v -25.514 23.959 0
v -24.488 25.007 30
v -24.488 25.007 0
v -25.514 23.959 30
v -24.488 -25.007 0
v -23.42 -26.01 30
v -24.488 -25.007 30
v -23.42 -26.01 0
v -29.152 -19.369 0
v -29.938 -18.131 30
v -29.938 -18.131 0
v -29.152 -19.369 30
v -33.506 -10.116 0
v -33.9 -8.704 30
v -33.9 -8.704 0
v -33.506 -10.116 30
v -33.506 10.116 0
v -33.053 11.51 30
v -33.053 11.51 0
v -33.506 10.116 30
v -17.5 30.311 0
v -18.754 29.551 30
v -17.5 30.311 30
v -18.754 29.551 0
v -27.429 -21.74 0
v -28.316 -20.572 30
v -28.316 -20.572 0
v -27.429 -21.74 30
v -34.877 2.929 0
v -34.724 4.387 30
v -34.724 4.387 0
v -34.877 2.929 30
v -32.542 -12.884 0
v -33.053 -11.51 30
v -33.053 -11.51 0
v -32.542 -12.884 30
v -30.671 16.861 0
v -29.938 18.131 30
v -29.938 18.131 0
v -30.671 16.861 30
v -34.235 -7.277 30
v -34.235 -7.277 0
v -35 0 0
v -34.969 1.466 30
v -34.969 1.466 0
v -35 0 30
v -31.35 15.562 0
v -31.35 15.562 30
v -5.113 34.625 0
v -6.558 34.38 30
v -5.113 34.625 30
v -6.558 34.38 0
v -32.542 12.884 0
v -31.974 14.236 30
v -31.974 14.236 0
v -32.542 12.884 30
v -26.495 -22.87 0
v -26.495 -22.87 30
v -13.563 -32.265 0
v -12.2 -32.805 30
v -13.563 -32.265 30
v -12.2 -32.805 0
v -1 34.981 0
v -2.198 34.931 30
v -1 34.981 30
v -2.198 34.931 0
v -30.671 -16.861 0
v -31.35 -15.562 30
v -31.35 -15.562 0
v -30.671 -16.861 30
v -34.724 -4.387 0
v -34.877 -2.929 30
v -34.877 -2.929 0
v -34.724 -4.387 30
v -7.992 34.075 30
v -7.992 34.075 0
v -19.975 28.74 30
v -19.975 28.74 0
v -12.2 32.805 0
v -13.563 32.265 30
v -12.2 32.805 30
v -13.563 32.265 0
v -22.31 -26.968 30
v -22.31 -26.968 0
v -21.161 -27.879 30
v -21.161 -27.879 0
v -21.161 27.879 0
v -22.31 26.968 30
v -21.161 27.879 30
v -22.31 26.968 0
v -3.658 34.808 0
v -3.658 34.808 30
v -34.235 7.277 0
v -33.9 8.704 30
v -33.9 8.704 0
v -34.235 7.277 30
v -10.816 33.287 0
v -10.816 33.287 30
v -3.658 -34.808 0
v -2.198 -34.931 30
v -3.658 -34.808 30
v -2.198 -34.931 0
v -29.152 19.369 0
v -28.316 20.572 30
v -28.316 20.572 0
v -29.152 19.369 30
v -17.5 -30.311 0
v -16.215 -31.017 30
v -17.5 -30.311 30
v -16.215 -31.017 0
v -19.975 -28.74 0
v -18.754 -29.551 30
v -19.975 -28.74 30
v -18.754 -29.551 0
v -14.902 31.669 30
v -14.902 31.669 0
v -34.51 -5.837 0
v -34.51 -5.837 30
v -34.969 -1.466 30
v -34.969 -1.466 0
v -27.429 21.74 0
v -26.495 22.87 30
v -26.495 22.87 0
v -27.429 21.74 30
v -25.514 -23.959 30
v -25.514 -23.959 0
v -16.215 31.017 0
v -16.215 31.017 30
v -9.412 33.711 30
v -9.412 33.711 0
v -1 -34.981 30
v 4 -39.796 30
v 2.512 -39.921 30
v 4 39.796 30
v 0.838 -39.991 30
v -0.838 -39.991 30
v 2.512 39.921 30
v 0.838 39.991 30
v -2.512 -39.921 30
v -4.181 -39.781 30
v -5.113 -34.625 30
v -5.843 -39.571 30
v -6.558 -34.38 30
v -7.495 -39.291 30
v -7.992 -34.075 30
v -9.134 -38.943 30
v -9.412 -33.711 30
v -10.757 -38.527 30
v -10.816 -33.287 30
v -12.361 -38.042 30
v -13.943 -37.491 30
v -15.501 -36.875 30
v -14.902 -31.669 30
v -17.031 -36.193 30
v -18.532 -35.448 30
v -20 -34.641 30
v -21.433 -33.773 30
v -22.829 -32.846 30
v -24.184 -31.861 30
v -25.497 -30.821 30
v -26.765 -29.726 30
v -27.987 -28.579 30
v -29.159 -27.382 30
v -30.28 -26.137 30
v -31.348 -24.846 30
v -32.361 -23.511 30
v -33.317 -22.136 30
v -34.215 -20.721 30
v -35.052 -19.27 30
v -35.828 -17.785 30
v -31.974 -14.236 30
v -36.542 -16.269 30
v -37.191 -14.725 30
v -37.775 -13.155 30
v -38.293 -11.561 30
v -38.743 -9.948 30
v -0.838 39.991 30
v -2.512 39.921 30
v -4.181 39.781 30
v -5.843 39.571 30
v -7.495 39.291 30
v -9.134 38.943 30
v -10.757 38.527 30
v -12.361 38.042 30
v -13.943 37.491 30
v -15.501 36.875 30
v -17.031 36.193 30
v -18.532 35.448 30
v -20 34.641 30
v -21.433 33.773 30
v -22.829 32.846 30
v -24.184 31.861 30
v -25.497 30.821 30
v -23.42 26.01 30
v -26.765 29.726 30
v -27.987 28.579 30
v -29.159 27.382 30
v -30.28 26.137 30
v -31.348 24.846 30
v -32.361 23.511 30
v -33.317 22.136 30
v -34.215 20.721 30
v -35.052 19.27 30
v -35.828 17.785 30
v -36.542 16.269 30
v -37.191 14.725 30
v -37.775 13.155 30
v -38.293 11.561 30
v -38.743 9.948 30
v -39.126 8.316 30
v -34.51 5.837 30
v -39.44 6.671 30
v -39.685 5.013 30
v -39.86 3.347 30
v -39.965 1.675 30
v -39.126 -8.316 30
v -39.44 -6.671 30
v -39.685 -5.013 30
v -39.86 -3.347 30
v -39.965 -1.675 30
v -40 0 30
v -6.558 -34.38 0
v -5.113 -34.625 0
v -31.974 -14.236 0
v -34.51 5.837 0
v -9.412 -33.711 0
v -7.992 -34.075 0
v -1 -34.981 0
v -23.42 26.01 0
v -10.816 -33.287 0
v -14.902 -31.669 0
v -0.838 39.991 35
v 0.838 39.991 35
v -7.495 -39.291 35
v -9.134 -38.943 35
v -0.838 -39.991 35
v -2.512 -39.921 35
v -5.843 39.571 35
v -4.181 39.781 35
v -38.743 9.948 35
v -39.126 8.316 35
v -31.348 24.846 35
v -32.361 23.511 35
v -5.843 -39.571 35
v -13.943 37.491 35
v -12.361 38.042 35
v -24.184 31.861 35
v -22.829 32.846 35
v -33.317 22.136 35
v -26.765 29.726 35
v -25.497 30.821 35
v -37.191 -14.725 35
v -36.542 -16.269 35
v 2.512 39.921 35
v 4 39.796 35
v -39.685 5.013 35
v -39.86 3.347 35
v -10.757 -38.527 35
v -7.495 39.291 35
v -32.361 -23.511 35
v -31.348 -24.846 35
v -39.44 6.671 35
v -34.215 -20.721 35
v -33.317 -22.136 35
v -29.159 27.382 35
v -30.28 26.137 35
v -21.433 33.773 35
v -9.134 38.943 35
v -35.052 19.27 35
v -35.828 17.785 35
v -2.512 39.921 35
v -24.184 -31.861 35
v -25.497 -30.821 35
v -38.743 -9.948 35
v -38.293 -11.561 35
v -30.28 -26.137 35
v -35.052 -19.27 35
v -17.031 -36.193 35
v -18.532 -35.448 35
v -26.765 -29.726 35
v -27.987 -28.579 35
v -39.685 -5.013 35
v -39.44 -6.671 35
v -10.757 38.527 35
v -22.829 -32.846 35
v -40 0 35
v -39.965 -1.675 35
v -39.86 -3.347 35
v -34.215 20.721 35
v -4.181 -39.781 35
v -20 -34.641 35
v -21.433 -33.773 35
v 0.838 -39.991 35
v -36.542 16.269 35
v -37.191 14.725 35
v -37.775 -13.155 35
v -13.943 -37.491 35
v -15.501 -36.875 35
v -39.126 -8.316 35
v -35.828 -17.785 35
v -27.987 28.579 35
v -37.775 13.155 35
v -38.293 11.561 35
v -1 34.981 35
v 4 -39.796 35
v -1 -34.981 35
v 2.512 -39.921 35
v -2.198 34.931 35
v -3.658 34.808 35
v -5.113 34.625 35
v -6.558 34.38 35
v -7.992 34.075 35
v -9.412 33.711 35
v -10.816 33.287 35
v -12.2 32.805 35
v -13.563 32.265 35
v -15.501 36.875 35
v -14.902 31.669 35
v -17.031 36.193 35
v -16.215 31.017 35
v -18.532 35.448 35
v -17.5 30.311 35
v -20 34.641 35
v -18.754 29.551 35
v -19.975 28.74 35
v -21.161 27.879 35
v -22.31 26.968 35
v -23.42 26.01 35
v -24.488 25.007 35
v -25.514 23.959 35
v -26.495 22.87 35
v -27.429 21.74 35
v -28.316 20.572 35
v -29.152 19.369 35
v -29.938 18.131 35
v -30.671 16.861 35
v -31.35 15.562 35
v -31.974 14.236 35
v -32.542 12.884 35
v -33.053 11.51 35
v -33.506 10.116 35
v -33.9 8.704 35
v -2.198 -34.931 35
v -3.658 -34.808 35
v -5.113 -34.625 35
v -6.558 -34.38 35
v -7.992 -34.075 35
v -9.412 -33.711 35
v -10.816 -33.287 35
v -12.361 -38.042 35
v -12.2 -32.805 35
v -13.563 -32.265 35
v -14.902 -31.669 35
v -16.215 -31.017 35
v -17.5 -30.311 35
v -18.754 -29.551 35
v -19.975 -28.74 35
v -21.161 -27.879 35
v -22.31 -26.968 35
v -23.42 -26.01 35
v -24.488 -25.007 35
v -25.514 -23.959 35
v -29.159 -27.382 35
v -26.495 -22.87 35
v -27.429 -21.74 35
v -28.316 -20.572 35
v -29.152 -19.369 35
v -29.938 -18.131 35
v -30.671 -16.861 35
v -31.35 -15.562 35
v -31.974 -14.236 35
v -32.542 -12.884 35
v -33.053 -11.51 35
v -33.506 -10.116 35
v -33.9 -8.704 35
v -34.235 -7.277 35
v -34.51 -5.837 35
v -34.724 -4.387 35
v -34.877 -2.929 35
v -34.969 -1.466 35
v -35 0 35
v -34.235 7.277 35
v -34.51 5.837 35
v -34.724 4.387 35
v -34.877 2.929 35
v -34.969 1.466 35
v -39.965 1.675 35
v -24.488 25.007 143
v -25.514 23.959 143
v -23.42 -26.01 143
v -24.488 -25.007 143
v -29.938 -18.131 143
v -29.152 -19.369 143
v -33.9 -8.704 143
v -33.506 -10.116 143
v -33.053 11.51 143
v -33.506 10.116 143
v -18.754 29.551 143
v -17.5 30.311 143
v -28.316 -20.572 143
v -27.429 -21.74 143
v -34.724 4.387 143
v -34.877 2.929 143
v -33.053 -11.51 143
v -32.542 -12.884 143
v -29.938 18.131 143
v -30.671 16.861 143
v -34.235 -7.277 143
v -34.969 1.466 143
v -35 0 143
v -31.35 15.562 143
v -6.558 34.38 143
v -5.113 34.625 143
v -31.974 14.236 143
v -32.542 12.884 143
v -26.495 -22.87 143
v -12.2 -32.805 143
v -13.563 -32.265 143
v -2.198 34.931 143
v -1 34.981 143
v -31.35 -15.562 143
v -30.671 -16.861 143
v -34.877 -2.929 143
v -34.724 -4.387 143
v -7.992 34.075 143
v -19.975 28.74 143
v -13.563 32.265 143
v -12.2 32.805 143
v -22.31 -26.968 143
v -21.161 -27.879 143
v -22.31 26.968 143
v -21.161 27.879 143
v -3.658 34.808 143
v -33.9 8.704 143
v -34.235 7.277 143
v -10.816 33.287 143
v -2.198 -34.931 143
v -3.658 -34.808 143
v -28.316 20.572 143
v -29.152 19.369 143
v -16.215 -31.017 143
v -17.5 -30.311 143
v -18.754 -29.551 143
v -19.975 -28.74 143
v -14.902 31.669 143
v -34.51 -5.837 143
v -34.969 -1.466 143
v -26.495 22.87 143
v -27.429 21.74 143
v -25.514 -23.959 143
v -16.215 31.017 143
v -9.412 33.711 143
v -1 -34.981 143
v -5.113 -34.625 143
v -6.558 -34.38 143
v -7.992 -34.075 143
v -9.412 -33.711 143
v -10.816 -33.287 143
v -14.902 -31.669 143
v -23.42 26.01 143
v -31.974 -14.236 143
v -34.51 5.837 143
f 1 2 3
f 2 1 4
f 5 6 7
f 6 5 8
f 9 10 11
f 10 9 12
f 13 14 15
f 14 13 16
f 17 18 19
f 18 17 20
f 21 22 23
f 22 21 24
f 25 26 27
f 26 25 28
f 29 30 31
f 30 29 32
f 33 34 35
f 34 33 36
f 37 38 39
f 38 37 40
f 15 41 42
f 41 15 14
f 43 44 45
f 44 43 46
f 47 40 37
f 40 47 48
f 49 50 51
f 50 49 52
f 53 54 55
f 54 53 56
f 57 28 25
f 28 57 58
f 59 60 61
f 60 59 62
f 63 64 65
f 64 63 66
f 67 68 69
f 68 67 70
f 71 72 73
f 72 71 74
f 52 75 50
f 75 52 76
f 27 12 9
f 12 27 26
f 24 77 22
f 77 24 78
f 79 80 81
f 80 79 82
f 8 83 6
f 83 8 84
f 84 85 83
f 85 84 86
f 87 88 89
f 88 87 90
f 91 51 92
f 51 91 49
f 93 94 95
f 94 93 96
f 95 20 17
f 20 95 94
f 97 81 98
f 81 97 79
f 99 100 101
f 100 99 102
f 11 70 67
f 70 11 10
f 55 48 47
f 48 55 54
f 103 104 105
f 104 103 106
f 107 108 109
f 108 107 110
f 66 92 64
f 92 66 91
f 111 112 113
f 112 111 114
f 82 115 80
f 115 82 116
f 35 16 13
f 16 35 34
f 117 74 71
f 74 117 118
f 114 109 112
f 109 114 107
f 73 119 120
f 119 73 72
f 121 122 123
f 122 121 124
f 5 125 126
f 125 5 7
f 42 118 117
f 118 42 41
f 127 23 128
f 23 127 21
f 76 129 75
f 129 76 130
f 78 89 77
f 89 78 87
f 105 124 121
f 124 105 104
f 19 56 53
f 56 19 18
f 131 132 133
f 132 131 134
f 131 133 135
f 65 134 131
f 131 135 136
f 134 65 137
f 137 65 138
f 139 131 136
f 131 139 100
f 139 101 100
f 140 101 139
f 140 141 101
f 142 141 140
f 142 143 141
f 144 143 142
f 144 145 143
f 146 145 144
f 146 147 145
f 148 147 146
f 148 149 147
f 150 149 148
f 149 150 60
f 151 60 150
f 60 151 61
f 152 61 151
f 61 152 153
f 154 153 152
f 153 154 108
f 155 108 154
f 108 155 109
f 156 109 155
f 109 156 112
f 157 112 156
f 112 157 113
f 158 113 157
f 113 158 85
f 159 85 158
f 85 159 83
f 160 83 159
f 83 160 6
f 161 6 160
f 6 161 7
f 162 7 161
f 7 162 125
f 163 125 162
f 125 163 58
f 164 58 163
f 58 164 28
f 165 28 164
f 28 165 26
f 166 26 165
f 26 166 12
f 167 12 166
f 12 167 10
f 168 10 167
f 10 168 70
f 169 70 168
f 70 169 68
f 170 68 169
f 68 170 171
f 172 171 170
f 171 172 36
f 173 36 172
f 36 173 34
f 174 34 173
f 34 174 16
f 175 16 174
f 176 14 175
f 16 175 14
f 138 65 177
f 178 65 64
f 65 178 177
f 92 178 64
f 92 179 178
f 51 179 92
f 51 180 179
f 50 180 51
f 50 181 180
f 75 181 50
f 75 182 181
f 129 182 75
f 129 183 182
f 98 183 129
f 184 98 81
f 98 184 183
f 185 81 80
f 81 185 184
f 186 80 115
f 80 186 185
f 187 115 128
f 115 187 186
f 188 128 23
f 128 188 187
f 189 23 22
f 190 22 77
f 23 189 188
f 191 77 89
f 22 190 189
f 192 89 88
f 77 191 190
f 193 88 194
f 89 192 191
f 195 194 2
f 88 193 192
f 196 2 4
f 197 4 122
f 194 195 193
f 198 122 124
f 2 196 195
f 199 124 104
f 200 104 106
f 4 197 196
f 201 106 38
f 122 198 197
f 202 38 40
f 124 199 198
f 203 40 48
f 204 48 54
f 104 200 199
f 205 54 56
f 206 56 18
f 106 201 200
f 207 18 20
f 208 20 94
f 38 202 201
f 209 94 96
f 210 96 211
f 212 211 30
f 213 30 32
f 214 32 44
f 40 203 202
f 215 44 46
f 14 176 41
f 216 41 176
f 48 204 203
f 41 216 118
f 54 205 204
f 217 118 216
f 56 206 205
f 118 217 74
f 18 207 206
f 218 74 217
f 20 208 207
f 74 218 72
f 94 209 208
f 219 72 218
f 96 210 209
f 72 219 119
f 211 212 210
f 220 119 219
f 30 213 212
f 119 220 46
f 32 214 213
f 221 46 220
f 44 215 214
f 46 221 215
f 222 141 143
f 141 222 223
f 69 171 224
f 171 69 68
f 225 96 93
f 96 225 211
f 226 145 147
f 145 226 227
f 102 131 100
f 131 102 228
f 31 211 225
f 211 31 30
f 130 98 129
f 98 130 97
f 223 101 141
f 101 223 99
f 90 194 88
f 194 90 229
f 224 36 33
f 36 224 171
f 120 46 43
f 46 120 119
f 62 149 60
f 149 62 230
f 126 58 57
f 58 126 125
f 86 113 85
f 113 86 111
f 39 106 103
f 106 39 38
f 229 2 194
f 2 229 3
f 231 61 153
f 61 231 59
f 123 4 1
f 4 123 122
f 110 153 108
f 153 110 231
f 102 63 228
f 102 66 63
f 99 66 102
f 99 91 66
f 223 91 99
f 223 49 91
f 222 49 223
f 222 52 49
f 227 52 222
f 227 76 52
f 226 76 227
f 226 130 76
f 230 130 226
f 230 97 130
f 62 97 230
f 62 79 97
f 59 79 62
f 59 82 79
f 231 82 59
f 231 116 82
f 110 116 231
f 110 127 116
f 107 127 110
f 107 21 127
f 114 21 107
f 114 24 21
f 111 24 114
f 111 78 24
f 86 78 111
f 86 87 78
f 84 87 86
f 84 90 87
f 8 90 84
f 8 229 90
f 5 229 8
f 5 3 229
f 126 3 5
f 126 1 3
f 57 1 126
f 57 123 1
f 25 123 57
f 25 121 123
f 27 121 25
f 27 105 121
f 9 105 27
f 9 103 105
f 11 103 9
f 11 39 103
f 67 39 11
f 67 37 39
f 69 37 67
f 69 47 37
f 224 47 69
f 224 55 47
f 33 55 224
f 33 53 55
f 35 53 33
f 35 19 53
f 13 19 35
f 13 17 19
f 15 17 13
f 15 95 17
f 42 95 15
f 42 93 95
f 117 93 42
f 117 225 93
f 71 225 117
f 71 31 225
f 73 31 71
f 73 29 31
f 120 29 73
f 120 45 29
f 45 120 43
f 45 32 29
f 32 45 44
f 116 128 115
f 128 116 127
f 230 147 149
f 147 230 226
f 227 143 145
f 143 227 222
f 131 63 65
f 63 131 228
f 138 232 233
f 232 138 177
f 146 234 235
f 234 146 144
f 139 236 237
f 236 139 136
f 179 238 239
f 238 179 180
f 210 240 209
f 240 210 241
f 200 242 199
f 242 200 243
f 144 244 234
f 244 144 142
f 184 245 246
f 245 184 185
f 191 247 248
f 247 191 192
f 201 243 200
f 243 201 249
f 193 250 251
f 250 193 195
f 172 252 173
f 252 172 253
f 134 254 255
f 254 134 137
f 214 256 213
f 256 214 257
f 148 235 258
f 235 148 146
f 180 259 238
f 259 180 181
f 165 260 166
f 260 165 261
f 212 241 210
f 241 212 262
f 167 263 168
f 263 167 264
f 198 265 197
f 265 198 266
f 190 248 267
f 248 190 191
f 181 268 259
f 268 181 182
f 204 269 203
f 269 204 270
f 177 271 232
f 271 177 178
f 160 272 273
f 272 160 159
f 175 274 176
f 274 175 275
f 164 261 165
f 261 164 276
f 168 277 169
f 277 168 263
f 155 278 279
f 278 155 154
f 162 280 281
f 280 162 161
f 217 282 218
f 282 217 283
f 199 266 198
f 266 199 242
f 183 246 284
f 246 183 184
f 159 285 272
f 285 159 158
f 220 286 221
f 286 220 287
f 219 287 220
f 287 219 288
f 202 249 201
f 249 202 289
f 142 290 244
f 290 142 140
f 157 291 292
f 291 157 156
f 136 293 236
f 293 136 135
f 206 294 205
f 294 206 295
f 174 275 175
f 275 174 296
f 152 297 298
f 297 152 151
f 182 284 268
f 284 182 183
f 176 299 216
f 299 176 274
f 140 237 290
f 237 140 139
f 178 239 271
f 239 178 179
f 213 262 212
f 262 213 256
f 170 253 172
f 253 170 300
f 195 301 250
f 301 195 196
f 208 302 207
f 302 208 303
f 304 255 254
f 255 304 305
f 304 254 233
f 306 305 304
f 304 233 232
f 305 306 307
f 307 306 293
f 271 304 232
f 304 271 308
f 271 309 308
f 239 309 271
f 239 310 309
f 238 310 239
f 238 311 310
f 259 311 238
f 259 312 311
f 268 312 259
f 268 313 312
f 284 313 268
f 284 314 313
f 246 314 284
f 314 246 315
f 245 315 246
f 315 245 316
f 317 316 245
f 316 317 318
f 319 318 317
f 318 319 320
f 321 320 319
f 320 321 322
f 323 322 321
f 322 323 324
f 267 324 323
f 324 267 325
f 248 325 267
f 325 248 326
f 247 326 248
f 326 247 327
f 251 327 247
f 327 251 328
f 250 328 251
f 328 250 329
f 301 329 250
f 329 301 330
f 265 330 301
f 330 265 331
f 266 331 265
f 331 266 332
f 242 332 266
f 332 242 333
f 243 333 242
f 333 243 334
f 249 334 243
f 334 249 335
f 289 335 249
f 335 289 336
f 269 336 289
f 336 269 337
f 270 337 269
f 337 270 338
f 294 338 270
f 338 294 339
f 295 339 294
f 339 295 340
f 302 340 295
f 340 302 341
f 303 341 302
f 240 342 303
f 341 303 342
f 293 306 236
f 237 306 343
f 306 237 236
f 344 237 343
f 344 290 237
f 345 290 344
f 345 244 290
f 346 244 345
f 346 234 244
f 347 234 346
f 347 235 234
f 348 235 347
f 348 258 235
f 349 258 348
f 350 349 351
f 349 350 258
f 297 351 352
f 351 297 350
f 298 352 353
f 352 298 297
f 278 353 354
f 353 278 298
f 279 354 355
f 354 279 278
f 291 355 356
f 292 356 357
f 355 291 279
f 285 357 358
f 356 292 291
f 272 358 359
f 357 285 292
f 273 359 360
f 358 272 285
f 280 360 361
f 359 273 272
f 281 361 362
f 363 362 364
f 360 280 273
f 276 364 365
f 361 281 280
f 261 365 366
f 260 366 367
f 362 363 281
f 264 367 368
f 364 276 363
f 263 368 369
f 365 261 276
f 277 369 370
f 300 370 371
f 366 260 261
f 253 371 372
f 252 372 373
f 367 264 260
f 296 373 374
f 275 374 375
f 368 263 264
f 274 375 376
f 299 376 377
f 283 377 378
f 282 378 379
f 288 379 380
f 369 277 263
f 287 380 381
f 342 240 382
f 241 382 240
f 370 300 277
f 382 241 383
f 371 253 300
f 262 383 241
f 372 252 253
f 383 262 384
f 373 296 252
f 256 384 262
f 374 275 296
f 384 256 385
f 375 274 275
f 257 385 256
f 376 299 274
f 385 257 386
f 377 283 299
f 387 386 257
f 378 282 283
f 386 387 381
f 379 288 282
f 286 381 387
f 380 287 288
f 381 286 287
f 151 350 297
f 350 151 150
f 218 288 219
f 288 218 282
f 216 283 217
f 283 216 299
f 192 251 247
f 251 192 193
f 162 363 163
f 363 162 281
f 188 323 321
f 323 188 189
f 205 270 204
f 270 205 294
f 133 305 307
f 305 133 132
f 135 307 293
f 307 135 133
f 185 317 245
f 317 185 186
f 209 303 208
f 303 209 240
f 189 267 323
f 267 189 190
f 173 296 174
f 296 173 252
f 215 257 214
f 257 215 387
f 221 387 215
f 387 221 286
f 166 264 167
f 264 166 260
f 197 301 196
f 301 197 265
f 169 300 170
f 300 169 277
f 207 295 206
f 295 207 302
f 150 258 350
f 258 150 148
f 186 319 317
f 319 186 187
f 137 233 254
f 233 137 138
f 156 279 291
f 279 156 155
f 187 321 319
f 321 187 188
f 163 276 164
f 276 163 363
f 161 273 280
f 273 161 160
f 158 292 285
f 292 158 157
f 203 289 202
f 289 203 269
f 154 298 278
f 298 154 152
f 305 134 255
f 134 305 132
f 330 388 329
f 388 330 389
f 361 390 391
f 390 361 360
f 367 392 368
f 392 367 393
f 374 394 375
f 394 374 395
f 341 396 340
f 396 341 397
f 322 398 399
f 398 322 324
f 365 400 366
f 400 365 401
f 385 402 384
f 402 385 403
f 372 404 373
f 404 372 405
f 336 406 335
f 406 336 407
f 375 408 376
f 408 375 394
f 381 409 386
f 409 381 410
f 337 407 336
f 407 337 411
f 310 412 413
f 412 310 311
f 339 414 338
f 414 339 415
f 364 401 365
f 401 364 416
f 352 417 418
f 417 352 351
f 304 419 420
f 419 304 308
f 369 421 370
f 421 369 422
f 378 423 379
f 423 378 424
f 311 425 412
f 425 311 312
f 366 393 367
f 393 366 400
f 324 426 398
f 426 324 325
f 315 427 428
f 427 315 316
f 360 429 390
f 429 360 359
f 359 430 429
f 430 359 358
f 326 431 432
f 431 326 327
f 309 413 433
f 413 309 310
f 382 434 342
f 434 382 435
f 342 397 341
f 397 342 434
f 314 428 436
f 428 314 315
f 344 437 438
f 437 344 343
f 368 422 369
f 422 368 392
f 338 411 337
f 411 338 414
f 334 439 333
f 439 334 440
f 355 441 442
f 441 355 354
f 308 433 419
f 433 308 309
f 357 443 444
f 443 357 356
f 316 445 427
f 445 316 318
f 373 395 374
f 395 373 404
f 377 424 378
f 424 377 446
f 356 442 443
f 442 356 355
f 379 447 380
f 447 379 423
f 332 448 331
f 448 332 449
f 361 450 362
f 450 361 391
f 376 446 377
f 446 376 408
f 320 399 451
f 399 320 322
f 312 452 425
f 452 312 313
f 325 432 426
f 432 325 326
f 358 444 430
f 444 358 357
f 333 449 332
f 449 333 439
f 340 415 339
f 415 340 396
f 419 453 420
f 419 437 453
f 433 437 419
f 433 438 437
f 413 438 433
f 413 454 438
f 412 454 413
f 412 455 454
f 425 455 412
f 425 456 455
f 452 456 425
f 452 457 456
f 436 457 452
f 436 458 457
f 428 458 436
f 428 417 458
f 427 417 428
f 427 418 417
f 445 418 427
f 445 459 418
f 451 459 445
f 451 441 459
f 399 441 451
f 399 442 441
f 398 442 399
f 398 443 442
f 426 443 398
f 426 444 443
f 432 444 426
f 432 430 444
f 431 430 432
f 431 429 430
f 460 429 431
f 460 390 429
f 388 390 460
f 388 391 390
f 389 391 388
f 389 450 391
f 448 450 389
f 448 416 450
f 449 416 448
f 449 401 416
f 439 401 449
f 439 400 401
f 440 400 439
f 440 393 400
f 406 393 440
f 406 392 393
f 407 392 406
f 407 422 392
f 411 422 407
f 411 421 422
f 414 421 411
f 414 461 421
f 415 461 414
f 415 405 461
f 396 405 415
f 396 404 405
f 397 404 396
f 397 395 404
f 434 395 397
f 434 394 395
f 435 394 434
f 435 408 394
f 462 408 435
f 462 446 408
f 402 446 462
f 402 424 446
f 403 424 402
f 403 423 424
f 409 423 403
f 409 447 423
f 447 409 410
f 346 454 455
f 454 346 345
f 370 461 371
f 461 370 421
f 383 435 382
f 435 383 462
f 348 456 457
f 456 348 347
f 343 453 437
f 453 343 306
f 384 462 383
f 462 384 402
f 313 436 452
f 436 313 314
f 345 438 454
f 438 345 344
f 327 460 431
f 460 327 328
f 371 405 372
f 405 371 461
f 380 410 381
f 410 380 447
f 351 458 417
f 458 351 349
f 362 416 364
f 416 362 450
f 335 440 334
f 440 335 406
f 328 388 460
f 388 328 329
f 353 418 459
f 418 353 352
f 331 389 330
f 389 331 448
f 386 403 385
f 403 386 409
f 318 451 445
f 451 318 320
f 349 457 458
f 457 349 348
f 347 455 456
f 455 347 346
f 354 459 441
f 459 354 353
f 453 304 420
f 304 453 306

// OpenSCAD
/*
 * Juicer Pusher for Waring JEX328
 * @model JEX328
 *
 * @author Ivan Mihov
 * @email ivan@imihov.com
 * @web imihov.com
 * @date 06/19/2018
 */

//=============================
//Render Variables
//=============================
$fn=150;

//=============================
//Part Variables in mm
//=============================
top_shaft_height = 54;
bottom_shaft_height = 15;
radius = 35;
cross_section_cut = 34;

ring_thickness = 5;
ring_diameter_offset = 5;

// Build the top section of the pusher
module topShaft() {
	translate([0,0,top_shaft_height+(2*bottom_shaft_height)+ring_thickness]) difference(){
		cylinder(r=radius, h=2*top_shaft_height,  center=true);
		translate([cross_section_cut,0,0])
            cube([radius*2,radius*2+ring_thickness,2*top_shaft_height+1], center=true);
	}
}

// Build the bottom section of the pusher
module bottomShaft() {
	translate([0,0,bottom_shaft_height]) difference(){
		cylinder(r=radius, h=2*bottom_shaft_height,  center=true);
		translate([cross_section_cut,0,0])
            cube([radius*2,radius*2+ring_thickness,2*bottom_shaft_height+1], center=true);
	}
}

// Build the ring (stopper) around the pusher
module ring() {
    translate([0,0,2*bottom_shaft_height+ring_thickness/2]) difference() {
        cylinder(r=(radius)+ring_diameter_offset, h=ring_thickness,  center=true);
        translate([cross_section_cut+ring_diameter_offset,0,0])
            cube([radius*2,(radius*2)+(ring_diameter_offset*2),ring_thickness+1], center=true);
    }
}

bottomShaft();
ring();
topShaft();
